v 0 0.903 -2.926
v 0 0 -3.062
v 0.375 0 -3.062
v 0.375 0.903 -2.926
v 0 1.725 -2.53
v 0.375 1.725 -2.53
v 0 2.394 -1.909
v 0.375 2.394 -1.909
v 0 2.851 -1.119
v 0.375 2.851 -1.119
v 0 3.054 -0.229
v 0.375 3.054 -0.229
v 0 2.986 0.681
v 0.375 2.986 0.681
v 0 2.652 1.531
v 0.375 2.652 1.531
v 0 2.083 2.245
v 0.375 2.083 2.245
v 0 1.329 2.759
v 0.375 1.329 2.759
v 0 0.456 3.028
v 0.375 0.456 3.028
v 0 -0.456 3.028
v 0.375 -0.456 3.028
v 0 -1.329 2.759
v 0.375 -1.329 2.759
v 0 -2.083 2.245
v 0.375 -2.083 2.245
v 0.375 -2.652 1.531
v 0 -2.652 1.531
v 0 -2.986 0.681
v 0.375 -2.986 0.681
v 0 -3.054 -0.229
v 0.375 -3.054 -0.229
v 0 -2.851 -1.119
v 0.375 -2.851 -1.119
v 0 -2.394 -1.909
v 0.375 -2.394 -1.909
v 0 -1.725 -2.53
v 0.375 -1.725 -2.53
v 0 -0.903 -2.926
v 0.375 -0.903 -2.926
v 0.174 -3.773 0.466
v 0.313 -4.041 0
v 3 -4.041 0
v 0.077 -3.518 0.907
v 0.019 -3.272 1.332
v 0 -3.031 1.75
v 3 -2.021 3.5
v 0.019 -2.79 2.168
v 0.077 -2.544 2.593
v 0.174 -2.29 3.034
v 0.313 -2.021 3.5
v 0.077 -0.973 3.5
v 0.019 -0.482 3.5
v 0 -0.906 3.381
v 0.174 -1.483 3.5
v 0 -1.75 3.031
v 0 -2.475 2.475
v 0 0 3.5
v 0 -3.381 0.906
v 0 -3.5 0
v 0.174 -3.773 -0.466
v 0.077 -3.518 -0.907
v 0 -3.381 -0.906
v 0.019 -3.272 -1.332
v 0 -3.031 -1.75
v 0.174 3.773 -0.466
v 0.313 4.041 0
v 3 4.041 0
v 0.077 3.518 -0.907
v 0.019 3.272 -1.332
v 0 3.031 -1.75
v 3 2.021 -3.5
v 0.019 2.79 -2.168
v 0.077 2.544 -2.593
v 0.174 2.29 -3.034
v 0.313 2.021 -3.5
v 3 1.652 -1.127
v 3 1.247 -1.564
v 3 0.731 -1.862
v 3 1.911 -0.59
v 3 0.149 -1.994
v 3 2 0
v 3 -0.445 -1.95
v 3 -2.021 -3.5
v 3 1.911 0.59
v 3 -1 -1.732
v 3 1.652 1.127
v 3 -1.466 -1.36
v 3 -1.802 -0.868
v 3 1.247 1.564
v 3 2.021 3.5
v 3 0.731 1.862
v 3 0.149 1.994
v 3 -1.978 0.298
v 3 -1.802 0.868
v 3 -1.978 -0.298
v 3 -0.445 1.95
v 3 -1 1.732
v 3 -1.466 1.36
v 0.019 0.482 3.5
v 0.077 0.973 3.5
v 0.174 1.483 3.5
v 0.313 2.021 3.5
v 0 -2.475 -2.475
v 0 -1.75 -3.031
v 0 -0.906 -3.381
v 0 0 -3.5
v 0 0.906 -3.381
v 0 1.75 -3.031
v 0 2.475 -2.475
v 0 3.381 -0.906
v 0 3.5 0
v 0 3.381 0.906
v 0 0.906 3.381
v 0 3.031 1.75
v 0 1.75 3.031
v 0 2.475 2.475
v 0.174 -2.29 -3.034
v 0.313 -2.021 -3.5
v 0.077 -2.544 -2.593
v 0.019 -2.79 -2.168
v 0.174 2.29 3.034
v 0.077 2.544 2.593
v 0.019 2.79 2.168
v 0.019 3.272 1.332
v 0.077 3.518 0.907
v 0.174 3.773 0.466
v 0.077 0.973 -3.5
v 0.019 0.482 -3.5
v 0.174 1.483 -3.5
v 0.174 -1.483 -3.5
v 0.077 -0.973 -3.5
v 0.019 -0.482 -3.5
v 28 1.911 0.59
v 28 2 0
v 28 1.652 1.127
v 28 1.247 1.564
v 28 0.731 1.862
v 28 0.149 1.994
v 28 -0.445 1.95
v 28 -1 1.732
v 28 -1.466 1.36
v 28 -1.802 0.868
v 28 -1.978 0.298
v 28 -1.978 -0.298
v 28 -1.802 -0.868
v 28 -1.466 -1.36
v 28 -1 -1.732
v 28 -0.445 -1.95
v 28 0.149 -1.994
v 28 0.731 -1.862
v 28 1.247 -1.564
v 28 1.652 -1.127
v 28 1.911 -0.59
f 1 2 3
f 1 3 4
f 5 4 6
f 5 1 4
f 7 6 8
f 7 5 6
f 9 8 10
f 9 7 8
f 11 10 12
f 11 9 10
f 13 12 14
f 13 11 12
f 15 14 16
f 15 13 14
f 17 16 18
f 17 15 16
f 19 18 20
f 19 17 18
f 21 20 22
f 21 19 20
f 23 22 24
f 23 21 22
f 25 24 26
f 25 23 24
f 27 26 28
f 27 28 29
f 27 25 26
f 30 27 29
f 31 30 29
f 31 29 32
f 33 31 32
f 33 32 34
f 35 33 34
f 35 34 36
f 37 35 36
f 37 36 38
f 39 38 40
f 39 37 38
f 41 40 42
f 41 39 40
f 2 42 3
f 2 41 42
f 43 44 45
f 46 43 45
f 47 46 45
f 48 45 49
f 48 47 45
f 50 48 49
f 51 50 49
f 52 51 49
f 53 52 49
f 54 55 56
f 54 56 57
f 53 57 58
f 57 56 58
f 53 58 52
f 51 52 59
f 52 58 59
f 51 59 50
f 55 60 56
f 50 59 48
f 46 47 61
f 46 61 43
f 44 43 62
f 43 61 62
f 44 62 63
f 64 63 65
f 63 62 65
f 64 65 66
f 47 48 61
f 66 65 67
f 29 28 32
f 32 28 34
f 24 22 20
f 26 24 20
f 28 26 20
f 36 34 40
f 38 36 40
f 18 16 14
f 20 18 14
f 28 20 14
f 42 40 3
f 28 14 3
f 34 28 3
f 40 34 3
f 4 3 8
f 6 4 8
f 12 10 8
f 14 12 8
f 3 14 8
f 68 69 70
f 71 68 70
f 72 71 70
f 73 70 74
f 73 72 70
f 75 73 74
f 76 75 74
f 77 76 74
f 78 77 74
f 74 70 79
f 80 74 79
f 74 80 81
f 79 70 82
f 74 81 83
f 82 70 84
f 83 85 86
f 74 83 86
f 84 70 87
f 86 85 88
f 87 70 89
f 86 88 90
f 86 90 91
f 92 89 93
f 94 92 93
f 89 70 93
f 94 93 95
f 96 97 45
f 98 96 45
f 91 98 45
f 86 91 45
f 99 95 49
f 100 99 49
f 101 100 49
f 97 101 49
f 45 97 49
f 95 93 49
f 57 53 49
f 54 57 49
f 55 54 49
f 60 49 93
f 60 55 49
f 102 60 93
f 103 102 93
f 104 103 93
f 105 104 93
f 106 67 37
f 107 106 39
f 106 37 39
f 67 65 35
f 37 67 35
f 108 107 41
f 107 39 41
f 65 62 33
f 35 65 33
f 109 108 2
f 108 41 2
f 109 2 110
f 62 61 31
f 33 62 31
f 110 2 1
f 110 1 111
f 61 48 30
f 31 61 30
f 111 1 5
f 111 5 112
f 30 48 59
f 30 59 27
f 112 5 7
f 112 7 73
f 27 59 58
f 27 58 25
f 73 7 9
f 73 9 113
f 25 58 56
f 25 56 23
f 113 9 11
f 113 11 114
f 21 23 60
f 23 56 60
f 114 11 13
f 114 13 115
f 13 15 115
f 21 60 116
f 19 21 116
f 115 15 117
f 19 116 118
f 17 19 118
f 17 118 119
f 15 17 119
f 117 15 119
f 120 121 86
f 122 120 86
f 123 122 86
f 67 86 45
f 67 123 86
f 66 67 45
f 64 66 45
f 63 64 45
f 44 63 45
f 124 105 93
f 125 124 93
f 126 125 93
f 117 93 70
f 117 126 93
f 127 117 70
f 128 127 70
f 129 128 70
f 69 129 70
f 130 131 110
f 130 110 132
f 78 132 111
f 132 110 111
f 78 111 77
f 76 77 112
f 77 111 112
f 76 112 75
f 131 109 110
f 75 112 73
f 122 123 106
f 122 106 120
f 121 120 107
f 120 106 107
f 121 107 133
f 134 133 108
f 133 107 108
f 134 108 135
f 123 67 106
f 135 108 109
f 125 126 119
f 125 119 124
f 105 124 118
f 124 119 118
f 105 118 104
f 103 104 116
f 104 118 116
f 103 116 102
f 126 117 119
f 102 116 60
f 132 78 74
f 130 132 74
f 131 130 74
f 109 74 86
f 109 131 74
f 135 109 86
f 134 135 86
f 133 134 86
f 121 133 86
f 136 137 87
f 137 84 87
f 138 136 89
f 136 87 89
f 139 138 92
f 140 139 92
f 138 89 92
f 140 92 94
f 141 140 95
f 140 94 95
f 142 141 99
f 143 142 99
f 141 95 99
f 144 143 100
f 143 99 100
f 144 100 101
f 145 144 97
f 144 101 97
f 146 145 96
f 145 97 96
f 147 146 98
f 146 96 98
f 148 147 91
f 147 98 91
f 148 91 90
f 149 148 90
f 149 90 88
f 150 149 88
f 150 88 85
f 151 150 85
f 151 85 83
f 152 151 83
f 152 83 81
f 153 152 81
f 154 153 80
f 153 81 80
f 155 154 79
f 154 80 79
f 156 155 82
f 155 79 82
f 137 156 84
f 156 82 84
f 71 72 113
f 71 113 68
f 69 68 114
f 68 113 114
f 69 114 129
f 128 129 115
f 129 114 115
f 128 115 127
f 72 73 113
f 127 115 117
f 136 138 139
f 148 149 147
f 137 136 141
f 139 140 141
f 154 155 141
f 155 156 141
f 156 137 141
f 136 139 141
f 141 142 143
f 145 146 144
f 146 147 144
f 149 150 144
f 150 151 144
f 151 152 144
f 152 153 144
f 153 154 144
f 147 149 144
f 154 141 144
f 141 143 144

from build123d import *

# Parameters (mm, degrees)
SKETCH2_R     = 4.081986143
HEX_DIE_DEPTH = 3
SKETCH4_R     = 3.0625
INDENT_DEPTH  = 0.375


with BuildPart() as part:
    # BodySke → Base-Revolve (revolve)
    with BuildSketch(Plane.XY):
        Polygon((3, 2), (3, 4.041570439), (0.312675839, 4.041570439), (0, 3.5), (0, 0), (28, 0), (28, 2), align=None)
    revolve(axis=Axis((-25.4, 0, 0), (1, 0, 0)))

    # Sketch2 → Hex-Die (cut)
    with BuildSketch(Plane(origin=(0, 0, 0), x_dir=(0, 0, -1), z_dir=(1, 0, 0))):
        Circle(SKETCH2_R)
        Polygon((-3.5, 2.020725951), (0, 4.041451902), (3.5, 2.020725951), (3.5, -2.020725951), (0, -4.041451902), (-3.5, -2.020725951), align=None, mode=Mode.SUBTRACT)
    extrude(amount=HEX_DIE_DEPTH, mode=Mode.SUBTRACT)

    # Sketch4 → Indent (cut)
    with BuildSketch(Plane(origin=(0, 0, 0), x_dir=(0, 0, -1), z_dir=(1, 0, 0))):
        Circle(SKETCH4_R)
    extrude(amount=INDENT_DEPTH, mode=Mode.SUBTRACT)


solid = part.part
